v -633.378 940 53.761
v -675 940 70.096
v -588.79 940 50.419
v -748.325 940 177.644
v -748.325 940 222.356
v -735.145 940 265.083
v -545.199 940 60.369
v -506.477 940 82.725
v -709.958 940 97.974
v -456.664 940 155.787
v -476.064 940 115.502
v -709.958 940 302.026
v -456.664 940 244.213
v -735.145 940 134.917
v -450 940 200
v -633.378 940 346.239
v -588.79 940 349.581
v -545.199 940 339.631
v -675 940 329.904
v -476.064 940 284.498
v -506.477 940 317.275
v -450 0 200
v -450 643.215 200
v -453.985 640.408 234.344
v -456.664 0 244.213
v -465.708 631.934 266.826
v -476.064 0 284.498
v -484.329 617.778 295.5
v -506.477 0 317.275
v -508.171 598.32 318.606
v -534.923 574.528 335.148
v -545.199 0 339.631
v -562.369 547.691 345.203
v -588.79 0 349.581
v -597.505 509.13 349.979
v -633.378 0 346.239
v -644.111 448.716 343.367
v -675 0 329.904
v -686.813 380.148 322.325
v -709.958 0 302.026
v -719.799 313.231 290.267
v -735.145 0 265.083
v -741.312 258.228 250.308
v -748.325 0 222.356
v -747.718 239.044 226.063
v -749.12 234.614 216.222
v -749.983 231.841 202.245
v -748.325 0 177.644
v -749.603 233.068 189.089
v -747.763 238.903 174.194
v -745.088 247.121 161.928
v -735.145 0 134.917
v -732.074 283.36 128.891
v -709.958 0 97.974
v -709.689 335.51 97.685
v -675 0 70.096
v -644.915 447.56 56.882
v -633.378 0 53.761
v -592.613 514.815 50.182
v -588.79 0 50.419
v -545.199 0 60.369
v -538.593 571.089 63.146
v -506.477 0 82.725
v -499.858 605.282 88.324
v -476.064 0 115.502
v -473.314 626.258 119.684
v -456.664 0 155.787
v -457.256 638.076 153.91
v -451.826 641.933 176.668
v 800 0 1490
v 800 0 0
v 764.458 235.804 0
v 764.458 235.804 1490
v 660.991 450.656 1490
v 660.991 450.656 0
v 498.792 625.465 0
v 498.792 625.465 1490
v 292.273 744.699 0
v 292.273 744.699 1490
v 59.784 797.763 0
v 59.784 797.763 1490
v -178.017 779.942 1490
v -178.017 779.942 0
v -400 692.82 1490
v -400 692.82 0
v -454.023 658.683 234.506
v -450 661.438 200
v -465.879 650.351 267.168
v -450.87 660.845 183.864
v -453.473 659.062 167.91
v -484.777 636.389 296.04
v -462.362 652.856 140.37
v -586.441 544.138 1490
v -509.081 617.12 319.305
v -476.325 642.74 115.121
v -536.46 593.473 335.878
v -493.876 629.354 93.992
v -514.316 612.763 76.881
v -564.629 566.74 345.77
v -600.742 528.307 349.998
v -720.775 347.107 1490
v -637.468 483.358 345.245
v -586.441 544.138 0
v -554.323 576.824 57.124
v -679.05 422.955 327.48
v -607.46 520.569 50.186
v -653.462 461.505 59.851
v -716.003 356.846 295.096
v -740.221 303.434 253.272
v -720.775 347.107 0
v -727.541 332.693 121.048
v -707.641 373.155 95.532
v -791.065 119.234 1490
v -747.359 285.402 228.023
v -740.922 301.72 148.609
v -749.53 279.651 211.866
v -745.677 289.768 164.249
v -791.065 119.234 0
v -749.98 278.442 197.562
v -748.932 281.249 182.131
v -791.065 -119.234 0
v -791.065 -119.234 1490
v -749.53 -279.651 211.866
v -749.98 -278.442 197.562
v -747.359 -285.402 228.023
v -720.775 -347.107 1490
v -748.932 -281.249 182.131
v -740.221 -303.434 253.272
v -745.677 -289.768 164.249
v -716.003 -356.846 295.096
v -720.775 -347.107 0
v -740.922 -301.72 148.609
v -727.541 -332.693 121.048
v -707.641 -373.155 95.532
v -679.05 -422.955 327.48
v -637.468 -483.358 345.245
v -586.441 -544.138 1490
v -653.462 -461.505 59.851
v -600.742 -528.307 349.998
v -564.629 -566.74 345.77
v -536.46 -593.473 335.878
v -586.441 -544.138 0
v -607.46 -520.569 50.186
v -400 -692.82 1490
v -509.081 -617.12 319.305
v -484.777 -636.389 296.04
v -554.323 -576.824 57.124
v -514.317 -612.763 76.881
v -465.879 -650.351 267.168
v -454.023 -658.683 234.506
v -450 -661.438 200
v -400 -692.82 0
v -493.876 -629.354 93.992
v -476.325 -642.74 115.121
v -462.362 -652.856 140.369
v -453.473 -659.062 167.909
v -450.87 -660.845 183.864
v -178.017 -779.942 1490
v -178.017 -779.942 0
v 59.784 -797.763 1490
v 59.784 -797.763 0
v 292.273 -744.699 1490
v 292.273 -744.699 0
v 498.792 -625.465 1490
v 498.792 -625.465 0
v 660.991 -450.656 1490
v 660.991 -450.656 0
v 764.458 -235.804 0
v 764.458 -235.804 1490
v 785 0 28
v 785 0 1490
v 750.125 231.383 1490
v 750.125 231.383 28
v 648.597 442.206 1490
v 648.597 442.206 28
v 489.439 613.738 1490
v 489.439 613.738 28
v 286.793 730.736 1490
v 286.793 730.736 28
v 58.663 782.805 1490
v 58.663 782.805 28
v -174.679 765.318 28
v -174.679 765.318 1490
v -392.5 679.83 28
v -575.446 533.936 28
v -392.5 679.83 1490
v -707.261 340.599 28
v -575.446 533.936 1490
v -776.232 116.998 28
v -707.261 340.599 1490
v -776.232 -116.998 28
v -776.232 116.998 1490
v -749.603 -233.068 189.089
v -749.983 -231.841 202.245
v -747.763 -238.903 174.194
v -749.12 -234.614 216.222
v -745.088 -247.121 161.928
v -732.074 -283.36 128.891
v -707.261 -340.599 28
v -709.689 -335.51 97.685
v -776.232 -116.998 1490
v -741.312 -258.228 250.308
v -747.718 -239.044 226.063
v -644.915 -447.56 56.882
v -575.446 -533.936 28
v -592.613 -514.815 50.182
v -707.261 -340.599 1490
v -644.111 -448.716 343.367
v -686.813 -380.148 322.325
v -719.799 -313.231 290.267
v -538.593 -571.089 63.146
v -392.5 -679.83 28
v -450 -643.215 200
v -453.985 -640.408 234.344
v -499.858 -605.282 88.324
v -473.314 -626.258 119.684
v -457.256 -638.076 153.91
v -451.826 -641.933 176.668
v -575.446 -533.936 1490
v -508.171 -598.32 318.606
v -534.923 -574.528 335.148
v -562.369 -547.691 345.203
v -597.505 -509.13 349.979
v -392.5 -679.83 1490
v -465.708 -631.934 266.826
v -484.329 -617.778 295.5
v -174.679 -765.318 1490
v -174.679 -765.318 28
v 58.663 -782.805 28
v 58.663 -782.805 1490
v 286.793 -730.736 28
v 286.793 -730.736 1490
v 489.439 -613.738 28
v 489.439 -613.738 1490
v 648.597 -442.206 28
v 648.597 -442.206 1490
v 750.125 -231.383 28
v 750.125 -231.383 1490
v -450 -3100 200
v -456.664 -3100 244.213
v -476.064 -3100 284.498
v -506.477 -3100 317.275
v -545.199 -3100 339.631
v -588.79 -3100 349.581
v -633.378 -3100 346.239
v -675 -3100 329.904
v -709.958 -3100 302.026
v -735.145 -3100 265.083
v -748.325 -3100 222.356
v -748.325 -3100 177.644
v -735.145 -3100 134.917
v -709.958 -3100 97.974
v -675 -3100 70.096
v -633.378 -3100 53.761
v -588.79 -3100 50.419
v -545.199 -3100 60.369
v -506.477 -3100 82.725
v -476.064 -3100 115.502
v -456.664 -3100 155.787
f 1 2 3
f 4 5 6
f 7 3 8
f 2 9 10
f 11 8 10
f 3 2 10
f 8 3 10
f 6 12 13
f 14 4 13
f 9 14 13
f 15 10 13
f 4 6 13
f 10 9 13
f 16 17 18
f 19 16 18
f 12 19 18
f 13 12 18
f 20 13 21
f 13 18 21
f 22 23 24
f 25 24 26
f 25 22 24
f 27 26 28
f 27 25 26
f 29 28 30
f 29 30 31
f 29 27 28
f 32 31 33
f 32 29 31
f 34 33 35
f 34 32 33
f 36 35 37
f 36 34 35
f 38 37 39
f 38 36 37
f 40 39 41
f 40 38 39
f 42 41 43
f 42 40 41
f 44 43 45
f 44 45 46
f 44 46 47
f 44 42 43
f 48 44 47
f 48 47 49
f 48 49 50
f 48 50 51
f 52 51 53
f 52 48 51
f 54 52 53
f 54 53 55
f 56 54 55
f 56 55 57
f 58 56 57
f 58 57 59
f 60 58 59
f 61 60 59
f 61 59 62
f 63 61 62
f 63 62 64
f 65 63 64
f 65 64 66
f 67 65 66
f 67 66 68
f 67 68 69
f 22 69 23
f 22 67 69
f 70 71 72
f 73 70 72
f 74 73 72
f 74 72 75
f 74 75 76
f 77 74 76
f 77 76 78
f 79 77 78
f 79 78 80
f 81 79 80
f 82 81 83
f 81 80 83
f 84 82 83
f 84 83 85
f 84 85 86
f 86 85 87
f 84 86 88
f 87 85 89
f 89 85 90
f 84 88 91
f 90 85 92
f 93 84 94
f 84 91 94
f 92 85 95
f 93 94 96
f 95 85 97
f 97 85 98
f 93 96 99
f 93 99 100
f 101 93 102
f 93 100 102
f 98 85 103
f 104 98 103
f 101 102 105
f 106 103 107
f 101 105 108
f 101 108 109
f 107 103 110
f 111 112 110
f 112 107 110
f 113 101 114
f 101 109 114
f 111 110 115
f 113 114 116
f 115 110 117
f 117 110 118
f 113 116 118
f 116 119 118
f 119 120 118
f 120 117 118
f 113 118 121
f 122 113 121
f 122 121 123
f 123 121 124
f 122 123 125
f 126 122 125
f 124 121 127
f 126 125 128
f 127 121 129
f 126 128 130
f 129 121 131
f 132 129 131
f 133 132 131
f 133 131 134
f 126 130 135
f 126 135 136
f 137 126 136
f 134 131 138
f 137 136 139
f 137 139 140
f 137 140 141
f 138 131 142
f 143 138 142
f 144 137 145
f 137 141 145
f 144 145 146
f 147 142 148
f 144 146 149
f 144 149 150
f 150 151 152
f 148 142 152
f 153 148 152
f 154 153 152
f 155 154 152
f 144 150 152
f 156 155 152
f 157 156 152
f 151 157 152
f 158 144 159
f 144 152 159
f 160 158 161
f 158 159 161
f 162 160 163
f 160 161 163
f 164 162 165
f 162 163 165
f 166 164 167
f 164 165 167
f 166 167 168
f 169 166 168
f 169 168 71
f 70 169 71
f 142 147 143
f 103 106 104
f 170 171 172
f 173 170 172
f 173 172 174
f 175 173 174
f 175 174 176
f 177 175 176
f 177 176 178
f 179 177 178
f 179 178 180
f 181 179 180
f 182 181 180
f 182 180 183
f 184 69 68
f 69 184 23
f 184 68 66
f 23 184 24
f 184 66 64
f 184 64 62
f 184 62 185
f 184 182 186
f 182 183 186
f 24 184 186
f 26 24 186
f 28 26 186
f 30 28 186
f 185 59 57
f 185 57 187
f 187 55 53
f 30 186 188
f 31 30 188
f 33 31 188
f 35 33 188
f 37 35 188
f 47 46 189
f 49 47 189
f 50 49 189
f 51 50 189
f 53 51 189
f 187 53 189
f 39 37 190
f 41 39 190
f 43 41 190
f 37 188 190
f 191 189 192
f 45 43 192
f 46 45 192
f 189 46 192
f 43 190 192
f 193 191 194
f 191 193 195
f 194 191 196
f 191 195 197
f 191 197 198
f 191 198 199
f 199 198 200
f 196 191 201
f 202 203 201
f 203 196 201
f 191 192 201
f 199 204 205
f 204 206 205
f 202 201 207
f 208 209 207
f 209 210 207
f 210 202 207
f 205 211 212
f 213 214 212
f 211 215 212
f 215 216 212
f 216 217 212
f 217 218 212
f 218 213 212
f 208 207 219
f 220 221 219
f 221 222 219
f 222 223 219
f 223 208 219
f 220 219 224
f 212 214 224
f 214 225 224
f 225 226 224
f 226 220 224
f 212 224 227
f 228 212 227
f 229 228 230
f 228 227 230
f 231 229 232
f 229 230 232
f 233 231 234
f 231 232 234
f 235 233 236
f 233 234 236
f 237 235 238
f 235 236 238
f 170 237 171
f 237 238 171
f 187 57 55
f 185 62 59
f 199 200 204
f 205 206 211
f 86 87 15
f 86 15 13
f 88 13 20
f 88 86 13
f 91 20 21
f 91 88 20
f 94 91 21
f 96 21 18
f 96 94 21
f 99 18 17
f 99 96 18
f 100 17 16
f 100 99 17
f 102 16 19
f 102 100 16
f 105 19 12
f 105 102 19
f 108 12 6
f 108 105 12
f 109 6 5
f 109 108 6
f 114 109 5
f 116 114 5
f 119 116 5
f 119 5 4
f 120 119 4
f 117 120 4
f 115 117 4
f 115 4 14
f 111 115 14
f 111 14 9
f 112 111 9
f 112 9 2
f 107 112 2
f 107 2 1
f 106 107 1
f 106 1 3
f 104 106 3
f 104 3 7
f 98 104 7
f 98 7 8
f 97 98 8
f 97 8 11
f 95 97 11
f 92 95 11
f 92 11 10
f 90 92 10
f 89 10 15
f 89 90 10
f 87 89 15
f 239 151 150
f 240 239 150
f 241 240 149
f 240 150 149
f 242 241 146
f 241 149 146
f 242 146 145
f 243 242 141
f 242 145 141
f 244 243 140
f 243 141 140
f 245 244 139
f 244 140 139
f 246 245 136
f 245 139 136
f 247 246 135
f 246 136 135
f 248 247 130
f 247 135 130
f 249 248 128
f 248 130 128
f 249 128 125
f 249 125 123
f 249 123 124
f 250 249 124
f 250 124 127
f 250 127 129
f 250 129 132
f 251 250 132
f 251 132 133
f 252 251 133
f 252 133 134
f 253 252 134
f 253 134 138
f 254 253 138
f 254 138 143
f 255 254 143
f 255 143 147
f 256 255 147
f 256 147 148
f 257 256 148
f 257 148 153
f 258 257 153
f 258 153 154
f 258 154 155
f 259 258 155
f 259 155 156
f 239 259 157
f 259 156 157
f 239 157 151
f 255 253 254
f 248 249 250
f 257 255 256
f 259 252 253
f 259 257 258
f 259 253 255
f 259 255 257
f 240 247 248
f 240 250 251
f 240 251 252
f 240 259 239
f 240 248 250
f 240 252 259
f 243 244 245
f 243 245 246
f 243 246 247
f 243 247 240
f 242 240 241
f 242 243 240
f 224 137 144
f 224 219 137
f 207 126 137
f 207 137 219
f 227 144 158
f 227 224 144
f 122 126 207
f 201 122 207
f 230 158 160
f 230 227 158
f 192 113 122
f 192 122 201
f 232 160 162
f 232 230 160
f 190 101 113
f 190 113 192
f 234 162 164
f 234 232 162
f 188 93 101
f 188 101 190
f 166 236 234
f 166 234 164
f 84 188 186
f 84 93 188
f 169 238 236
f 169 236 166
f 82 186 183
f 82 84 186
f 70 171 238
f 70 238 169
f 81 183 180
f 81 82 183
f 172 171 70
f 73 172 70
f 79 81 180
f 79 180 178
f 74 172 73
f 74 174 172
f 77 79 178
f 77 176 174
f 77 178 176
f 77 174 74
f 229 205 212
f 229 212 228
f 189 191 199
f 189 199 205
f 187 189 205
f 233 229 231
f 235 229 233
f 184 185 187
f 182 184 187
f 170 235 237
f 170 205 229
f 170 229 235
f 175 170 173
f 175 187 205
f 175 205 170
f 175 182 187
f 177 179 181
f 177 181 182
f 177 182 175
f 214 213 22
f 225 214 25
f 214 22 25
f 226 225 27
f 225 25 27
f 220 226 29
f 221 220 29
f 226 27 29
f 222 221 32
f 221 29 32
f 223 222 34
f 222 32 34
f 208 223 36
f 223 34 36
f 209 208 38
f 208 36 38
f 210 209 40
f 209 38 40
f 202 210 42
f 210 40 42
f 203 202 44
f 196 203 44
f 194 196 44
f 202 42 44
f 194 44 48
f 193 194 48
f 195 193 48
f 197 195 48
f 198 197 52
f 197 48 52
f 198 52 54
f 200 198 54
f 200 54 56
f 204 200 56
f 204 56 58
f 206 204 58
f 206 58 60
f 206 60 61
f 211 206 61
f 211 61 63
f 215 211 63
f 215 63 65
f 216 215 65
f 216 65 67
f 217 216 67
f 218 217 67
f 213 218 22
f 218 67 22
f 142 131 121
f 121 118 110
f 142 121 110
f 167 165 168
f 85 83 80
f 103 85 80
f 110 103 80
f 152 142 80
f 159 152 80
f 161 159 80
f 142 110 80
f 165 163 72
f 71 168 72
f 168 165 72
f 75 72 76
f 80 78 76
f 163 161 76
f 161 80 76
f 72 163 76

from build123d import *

# Parameters (mm, degrees)
F0_R          = 800
F1_DEPTH      = 1490
F2_R          = 785
F3_DEPTH      = 1462
F4_R          = 150
F5_DEPTH      = 3100
F5_DEPTH_BACK = 940


with BuildPart() as f1:
    # F0 (on Top) → F1 (new body)
    with BuildSketch(Plane.XY):
        Circle(F0_R)
    extrude(amount=F1_DEPTH)

    # F2 (on face) → F3 (cut)
    with BuildSketch(Plane.XY.offset(1490)):
        Circle(F2_R)
    extrude(amount=-F3_DEPTH, mode=Mode.SUBTRACT)

    # F4 (on Front) → F5 (join, two sides)
    with BuildSketch(Plane.XZ) as f5_sk:
        with Locations((-600, 200)):
            Circle(F4_R)
    extrude(amount=F5_DEPTH)
    extrude(f5_sk.sketch, amount=-F5_DEPTH_BACK)


solid = f1.part
